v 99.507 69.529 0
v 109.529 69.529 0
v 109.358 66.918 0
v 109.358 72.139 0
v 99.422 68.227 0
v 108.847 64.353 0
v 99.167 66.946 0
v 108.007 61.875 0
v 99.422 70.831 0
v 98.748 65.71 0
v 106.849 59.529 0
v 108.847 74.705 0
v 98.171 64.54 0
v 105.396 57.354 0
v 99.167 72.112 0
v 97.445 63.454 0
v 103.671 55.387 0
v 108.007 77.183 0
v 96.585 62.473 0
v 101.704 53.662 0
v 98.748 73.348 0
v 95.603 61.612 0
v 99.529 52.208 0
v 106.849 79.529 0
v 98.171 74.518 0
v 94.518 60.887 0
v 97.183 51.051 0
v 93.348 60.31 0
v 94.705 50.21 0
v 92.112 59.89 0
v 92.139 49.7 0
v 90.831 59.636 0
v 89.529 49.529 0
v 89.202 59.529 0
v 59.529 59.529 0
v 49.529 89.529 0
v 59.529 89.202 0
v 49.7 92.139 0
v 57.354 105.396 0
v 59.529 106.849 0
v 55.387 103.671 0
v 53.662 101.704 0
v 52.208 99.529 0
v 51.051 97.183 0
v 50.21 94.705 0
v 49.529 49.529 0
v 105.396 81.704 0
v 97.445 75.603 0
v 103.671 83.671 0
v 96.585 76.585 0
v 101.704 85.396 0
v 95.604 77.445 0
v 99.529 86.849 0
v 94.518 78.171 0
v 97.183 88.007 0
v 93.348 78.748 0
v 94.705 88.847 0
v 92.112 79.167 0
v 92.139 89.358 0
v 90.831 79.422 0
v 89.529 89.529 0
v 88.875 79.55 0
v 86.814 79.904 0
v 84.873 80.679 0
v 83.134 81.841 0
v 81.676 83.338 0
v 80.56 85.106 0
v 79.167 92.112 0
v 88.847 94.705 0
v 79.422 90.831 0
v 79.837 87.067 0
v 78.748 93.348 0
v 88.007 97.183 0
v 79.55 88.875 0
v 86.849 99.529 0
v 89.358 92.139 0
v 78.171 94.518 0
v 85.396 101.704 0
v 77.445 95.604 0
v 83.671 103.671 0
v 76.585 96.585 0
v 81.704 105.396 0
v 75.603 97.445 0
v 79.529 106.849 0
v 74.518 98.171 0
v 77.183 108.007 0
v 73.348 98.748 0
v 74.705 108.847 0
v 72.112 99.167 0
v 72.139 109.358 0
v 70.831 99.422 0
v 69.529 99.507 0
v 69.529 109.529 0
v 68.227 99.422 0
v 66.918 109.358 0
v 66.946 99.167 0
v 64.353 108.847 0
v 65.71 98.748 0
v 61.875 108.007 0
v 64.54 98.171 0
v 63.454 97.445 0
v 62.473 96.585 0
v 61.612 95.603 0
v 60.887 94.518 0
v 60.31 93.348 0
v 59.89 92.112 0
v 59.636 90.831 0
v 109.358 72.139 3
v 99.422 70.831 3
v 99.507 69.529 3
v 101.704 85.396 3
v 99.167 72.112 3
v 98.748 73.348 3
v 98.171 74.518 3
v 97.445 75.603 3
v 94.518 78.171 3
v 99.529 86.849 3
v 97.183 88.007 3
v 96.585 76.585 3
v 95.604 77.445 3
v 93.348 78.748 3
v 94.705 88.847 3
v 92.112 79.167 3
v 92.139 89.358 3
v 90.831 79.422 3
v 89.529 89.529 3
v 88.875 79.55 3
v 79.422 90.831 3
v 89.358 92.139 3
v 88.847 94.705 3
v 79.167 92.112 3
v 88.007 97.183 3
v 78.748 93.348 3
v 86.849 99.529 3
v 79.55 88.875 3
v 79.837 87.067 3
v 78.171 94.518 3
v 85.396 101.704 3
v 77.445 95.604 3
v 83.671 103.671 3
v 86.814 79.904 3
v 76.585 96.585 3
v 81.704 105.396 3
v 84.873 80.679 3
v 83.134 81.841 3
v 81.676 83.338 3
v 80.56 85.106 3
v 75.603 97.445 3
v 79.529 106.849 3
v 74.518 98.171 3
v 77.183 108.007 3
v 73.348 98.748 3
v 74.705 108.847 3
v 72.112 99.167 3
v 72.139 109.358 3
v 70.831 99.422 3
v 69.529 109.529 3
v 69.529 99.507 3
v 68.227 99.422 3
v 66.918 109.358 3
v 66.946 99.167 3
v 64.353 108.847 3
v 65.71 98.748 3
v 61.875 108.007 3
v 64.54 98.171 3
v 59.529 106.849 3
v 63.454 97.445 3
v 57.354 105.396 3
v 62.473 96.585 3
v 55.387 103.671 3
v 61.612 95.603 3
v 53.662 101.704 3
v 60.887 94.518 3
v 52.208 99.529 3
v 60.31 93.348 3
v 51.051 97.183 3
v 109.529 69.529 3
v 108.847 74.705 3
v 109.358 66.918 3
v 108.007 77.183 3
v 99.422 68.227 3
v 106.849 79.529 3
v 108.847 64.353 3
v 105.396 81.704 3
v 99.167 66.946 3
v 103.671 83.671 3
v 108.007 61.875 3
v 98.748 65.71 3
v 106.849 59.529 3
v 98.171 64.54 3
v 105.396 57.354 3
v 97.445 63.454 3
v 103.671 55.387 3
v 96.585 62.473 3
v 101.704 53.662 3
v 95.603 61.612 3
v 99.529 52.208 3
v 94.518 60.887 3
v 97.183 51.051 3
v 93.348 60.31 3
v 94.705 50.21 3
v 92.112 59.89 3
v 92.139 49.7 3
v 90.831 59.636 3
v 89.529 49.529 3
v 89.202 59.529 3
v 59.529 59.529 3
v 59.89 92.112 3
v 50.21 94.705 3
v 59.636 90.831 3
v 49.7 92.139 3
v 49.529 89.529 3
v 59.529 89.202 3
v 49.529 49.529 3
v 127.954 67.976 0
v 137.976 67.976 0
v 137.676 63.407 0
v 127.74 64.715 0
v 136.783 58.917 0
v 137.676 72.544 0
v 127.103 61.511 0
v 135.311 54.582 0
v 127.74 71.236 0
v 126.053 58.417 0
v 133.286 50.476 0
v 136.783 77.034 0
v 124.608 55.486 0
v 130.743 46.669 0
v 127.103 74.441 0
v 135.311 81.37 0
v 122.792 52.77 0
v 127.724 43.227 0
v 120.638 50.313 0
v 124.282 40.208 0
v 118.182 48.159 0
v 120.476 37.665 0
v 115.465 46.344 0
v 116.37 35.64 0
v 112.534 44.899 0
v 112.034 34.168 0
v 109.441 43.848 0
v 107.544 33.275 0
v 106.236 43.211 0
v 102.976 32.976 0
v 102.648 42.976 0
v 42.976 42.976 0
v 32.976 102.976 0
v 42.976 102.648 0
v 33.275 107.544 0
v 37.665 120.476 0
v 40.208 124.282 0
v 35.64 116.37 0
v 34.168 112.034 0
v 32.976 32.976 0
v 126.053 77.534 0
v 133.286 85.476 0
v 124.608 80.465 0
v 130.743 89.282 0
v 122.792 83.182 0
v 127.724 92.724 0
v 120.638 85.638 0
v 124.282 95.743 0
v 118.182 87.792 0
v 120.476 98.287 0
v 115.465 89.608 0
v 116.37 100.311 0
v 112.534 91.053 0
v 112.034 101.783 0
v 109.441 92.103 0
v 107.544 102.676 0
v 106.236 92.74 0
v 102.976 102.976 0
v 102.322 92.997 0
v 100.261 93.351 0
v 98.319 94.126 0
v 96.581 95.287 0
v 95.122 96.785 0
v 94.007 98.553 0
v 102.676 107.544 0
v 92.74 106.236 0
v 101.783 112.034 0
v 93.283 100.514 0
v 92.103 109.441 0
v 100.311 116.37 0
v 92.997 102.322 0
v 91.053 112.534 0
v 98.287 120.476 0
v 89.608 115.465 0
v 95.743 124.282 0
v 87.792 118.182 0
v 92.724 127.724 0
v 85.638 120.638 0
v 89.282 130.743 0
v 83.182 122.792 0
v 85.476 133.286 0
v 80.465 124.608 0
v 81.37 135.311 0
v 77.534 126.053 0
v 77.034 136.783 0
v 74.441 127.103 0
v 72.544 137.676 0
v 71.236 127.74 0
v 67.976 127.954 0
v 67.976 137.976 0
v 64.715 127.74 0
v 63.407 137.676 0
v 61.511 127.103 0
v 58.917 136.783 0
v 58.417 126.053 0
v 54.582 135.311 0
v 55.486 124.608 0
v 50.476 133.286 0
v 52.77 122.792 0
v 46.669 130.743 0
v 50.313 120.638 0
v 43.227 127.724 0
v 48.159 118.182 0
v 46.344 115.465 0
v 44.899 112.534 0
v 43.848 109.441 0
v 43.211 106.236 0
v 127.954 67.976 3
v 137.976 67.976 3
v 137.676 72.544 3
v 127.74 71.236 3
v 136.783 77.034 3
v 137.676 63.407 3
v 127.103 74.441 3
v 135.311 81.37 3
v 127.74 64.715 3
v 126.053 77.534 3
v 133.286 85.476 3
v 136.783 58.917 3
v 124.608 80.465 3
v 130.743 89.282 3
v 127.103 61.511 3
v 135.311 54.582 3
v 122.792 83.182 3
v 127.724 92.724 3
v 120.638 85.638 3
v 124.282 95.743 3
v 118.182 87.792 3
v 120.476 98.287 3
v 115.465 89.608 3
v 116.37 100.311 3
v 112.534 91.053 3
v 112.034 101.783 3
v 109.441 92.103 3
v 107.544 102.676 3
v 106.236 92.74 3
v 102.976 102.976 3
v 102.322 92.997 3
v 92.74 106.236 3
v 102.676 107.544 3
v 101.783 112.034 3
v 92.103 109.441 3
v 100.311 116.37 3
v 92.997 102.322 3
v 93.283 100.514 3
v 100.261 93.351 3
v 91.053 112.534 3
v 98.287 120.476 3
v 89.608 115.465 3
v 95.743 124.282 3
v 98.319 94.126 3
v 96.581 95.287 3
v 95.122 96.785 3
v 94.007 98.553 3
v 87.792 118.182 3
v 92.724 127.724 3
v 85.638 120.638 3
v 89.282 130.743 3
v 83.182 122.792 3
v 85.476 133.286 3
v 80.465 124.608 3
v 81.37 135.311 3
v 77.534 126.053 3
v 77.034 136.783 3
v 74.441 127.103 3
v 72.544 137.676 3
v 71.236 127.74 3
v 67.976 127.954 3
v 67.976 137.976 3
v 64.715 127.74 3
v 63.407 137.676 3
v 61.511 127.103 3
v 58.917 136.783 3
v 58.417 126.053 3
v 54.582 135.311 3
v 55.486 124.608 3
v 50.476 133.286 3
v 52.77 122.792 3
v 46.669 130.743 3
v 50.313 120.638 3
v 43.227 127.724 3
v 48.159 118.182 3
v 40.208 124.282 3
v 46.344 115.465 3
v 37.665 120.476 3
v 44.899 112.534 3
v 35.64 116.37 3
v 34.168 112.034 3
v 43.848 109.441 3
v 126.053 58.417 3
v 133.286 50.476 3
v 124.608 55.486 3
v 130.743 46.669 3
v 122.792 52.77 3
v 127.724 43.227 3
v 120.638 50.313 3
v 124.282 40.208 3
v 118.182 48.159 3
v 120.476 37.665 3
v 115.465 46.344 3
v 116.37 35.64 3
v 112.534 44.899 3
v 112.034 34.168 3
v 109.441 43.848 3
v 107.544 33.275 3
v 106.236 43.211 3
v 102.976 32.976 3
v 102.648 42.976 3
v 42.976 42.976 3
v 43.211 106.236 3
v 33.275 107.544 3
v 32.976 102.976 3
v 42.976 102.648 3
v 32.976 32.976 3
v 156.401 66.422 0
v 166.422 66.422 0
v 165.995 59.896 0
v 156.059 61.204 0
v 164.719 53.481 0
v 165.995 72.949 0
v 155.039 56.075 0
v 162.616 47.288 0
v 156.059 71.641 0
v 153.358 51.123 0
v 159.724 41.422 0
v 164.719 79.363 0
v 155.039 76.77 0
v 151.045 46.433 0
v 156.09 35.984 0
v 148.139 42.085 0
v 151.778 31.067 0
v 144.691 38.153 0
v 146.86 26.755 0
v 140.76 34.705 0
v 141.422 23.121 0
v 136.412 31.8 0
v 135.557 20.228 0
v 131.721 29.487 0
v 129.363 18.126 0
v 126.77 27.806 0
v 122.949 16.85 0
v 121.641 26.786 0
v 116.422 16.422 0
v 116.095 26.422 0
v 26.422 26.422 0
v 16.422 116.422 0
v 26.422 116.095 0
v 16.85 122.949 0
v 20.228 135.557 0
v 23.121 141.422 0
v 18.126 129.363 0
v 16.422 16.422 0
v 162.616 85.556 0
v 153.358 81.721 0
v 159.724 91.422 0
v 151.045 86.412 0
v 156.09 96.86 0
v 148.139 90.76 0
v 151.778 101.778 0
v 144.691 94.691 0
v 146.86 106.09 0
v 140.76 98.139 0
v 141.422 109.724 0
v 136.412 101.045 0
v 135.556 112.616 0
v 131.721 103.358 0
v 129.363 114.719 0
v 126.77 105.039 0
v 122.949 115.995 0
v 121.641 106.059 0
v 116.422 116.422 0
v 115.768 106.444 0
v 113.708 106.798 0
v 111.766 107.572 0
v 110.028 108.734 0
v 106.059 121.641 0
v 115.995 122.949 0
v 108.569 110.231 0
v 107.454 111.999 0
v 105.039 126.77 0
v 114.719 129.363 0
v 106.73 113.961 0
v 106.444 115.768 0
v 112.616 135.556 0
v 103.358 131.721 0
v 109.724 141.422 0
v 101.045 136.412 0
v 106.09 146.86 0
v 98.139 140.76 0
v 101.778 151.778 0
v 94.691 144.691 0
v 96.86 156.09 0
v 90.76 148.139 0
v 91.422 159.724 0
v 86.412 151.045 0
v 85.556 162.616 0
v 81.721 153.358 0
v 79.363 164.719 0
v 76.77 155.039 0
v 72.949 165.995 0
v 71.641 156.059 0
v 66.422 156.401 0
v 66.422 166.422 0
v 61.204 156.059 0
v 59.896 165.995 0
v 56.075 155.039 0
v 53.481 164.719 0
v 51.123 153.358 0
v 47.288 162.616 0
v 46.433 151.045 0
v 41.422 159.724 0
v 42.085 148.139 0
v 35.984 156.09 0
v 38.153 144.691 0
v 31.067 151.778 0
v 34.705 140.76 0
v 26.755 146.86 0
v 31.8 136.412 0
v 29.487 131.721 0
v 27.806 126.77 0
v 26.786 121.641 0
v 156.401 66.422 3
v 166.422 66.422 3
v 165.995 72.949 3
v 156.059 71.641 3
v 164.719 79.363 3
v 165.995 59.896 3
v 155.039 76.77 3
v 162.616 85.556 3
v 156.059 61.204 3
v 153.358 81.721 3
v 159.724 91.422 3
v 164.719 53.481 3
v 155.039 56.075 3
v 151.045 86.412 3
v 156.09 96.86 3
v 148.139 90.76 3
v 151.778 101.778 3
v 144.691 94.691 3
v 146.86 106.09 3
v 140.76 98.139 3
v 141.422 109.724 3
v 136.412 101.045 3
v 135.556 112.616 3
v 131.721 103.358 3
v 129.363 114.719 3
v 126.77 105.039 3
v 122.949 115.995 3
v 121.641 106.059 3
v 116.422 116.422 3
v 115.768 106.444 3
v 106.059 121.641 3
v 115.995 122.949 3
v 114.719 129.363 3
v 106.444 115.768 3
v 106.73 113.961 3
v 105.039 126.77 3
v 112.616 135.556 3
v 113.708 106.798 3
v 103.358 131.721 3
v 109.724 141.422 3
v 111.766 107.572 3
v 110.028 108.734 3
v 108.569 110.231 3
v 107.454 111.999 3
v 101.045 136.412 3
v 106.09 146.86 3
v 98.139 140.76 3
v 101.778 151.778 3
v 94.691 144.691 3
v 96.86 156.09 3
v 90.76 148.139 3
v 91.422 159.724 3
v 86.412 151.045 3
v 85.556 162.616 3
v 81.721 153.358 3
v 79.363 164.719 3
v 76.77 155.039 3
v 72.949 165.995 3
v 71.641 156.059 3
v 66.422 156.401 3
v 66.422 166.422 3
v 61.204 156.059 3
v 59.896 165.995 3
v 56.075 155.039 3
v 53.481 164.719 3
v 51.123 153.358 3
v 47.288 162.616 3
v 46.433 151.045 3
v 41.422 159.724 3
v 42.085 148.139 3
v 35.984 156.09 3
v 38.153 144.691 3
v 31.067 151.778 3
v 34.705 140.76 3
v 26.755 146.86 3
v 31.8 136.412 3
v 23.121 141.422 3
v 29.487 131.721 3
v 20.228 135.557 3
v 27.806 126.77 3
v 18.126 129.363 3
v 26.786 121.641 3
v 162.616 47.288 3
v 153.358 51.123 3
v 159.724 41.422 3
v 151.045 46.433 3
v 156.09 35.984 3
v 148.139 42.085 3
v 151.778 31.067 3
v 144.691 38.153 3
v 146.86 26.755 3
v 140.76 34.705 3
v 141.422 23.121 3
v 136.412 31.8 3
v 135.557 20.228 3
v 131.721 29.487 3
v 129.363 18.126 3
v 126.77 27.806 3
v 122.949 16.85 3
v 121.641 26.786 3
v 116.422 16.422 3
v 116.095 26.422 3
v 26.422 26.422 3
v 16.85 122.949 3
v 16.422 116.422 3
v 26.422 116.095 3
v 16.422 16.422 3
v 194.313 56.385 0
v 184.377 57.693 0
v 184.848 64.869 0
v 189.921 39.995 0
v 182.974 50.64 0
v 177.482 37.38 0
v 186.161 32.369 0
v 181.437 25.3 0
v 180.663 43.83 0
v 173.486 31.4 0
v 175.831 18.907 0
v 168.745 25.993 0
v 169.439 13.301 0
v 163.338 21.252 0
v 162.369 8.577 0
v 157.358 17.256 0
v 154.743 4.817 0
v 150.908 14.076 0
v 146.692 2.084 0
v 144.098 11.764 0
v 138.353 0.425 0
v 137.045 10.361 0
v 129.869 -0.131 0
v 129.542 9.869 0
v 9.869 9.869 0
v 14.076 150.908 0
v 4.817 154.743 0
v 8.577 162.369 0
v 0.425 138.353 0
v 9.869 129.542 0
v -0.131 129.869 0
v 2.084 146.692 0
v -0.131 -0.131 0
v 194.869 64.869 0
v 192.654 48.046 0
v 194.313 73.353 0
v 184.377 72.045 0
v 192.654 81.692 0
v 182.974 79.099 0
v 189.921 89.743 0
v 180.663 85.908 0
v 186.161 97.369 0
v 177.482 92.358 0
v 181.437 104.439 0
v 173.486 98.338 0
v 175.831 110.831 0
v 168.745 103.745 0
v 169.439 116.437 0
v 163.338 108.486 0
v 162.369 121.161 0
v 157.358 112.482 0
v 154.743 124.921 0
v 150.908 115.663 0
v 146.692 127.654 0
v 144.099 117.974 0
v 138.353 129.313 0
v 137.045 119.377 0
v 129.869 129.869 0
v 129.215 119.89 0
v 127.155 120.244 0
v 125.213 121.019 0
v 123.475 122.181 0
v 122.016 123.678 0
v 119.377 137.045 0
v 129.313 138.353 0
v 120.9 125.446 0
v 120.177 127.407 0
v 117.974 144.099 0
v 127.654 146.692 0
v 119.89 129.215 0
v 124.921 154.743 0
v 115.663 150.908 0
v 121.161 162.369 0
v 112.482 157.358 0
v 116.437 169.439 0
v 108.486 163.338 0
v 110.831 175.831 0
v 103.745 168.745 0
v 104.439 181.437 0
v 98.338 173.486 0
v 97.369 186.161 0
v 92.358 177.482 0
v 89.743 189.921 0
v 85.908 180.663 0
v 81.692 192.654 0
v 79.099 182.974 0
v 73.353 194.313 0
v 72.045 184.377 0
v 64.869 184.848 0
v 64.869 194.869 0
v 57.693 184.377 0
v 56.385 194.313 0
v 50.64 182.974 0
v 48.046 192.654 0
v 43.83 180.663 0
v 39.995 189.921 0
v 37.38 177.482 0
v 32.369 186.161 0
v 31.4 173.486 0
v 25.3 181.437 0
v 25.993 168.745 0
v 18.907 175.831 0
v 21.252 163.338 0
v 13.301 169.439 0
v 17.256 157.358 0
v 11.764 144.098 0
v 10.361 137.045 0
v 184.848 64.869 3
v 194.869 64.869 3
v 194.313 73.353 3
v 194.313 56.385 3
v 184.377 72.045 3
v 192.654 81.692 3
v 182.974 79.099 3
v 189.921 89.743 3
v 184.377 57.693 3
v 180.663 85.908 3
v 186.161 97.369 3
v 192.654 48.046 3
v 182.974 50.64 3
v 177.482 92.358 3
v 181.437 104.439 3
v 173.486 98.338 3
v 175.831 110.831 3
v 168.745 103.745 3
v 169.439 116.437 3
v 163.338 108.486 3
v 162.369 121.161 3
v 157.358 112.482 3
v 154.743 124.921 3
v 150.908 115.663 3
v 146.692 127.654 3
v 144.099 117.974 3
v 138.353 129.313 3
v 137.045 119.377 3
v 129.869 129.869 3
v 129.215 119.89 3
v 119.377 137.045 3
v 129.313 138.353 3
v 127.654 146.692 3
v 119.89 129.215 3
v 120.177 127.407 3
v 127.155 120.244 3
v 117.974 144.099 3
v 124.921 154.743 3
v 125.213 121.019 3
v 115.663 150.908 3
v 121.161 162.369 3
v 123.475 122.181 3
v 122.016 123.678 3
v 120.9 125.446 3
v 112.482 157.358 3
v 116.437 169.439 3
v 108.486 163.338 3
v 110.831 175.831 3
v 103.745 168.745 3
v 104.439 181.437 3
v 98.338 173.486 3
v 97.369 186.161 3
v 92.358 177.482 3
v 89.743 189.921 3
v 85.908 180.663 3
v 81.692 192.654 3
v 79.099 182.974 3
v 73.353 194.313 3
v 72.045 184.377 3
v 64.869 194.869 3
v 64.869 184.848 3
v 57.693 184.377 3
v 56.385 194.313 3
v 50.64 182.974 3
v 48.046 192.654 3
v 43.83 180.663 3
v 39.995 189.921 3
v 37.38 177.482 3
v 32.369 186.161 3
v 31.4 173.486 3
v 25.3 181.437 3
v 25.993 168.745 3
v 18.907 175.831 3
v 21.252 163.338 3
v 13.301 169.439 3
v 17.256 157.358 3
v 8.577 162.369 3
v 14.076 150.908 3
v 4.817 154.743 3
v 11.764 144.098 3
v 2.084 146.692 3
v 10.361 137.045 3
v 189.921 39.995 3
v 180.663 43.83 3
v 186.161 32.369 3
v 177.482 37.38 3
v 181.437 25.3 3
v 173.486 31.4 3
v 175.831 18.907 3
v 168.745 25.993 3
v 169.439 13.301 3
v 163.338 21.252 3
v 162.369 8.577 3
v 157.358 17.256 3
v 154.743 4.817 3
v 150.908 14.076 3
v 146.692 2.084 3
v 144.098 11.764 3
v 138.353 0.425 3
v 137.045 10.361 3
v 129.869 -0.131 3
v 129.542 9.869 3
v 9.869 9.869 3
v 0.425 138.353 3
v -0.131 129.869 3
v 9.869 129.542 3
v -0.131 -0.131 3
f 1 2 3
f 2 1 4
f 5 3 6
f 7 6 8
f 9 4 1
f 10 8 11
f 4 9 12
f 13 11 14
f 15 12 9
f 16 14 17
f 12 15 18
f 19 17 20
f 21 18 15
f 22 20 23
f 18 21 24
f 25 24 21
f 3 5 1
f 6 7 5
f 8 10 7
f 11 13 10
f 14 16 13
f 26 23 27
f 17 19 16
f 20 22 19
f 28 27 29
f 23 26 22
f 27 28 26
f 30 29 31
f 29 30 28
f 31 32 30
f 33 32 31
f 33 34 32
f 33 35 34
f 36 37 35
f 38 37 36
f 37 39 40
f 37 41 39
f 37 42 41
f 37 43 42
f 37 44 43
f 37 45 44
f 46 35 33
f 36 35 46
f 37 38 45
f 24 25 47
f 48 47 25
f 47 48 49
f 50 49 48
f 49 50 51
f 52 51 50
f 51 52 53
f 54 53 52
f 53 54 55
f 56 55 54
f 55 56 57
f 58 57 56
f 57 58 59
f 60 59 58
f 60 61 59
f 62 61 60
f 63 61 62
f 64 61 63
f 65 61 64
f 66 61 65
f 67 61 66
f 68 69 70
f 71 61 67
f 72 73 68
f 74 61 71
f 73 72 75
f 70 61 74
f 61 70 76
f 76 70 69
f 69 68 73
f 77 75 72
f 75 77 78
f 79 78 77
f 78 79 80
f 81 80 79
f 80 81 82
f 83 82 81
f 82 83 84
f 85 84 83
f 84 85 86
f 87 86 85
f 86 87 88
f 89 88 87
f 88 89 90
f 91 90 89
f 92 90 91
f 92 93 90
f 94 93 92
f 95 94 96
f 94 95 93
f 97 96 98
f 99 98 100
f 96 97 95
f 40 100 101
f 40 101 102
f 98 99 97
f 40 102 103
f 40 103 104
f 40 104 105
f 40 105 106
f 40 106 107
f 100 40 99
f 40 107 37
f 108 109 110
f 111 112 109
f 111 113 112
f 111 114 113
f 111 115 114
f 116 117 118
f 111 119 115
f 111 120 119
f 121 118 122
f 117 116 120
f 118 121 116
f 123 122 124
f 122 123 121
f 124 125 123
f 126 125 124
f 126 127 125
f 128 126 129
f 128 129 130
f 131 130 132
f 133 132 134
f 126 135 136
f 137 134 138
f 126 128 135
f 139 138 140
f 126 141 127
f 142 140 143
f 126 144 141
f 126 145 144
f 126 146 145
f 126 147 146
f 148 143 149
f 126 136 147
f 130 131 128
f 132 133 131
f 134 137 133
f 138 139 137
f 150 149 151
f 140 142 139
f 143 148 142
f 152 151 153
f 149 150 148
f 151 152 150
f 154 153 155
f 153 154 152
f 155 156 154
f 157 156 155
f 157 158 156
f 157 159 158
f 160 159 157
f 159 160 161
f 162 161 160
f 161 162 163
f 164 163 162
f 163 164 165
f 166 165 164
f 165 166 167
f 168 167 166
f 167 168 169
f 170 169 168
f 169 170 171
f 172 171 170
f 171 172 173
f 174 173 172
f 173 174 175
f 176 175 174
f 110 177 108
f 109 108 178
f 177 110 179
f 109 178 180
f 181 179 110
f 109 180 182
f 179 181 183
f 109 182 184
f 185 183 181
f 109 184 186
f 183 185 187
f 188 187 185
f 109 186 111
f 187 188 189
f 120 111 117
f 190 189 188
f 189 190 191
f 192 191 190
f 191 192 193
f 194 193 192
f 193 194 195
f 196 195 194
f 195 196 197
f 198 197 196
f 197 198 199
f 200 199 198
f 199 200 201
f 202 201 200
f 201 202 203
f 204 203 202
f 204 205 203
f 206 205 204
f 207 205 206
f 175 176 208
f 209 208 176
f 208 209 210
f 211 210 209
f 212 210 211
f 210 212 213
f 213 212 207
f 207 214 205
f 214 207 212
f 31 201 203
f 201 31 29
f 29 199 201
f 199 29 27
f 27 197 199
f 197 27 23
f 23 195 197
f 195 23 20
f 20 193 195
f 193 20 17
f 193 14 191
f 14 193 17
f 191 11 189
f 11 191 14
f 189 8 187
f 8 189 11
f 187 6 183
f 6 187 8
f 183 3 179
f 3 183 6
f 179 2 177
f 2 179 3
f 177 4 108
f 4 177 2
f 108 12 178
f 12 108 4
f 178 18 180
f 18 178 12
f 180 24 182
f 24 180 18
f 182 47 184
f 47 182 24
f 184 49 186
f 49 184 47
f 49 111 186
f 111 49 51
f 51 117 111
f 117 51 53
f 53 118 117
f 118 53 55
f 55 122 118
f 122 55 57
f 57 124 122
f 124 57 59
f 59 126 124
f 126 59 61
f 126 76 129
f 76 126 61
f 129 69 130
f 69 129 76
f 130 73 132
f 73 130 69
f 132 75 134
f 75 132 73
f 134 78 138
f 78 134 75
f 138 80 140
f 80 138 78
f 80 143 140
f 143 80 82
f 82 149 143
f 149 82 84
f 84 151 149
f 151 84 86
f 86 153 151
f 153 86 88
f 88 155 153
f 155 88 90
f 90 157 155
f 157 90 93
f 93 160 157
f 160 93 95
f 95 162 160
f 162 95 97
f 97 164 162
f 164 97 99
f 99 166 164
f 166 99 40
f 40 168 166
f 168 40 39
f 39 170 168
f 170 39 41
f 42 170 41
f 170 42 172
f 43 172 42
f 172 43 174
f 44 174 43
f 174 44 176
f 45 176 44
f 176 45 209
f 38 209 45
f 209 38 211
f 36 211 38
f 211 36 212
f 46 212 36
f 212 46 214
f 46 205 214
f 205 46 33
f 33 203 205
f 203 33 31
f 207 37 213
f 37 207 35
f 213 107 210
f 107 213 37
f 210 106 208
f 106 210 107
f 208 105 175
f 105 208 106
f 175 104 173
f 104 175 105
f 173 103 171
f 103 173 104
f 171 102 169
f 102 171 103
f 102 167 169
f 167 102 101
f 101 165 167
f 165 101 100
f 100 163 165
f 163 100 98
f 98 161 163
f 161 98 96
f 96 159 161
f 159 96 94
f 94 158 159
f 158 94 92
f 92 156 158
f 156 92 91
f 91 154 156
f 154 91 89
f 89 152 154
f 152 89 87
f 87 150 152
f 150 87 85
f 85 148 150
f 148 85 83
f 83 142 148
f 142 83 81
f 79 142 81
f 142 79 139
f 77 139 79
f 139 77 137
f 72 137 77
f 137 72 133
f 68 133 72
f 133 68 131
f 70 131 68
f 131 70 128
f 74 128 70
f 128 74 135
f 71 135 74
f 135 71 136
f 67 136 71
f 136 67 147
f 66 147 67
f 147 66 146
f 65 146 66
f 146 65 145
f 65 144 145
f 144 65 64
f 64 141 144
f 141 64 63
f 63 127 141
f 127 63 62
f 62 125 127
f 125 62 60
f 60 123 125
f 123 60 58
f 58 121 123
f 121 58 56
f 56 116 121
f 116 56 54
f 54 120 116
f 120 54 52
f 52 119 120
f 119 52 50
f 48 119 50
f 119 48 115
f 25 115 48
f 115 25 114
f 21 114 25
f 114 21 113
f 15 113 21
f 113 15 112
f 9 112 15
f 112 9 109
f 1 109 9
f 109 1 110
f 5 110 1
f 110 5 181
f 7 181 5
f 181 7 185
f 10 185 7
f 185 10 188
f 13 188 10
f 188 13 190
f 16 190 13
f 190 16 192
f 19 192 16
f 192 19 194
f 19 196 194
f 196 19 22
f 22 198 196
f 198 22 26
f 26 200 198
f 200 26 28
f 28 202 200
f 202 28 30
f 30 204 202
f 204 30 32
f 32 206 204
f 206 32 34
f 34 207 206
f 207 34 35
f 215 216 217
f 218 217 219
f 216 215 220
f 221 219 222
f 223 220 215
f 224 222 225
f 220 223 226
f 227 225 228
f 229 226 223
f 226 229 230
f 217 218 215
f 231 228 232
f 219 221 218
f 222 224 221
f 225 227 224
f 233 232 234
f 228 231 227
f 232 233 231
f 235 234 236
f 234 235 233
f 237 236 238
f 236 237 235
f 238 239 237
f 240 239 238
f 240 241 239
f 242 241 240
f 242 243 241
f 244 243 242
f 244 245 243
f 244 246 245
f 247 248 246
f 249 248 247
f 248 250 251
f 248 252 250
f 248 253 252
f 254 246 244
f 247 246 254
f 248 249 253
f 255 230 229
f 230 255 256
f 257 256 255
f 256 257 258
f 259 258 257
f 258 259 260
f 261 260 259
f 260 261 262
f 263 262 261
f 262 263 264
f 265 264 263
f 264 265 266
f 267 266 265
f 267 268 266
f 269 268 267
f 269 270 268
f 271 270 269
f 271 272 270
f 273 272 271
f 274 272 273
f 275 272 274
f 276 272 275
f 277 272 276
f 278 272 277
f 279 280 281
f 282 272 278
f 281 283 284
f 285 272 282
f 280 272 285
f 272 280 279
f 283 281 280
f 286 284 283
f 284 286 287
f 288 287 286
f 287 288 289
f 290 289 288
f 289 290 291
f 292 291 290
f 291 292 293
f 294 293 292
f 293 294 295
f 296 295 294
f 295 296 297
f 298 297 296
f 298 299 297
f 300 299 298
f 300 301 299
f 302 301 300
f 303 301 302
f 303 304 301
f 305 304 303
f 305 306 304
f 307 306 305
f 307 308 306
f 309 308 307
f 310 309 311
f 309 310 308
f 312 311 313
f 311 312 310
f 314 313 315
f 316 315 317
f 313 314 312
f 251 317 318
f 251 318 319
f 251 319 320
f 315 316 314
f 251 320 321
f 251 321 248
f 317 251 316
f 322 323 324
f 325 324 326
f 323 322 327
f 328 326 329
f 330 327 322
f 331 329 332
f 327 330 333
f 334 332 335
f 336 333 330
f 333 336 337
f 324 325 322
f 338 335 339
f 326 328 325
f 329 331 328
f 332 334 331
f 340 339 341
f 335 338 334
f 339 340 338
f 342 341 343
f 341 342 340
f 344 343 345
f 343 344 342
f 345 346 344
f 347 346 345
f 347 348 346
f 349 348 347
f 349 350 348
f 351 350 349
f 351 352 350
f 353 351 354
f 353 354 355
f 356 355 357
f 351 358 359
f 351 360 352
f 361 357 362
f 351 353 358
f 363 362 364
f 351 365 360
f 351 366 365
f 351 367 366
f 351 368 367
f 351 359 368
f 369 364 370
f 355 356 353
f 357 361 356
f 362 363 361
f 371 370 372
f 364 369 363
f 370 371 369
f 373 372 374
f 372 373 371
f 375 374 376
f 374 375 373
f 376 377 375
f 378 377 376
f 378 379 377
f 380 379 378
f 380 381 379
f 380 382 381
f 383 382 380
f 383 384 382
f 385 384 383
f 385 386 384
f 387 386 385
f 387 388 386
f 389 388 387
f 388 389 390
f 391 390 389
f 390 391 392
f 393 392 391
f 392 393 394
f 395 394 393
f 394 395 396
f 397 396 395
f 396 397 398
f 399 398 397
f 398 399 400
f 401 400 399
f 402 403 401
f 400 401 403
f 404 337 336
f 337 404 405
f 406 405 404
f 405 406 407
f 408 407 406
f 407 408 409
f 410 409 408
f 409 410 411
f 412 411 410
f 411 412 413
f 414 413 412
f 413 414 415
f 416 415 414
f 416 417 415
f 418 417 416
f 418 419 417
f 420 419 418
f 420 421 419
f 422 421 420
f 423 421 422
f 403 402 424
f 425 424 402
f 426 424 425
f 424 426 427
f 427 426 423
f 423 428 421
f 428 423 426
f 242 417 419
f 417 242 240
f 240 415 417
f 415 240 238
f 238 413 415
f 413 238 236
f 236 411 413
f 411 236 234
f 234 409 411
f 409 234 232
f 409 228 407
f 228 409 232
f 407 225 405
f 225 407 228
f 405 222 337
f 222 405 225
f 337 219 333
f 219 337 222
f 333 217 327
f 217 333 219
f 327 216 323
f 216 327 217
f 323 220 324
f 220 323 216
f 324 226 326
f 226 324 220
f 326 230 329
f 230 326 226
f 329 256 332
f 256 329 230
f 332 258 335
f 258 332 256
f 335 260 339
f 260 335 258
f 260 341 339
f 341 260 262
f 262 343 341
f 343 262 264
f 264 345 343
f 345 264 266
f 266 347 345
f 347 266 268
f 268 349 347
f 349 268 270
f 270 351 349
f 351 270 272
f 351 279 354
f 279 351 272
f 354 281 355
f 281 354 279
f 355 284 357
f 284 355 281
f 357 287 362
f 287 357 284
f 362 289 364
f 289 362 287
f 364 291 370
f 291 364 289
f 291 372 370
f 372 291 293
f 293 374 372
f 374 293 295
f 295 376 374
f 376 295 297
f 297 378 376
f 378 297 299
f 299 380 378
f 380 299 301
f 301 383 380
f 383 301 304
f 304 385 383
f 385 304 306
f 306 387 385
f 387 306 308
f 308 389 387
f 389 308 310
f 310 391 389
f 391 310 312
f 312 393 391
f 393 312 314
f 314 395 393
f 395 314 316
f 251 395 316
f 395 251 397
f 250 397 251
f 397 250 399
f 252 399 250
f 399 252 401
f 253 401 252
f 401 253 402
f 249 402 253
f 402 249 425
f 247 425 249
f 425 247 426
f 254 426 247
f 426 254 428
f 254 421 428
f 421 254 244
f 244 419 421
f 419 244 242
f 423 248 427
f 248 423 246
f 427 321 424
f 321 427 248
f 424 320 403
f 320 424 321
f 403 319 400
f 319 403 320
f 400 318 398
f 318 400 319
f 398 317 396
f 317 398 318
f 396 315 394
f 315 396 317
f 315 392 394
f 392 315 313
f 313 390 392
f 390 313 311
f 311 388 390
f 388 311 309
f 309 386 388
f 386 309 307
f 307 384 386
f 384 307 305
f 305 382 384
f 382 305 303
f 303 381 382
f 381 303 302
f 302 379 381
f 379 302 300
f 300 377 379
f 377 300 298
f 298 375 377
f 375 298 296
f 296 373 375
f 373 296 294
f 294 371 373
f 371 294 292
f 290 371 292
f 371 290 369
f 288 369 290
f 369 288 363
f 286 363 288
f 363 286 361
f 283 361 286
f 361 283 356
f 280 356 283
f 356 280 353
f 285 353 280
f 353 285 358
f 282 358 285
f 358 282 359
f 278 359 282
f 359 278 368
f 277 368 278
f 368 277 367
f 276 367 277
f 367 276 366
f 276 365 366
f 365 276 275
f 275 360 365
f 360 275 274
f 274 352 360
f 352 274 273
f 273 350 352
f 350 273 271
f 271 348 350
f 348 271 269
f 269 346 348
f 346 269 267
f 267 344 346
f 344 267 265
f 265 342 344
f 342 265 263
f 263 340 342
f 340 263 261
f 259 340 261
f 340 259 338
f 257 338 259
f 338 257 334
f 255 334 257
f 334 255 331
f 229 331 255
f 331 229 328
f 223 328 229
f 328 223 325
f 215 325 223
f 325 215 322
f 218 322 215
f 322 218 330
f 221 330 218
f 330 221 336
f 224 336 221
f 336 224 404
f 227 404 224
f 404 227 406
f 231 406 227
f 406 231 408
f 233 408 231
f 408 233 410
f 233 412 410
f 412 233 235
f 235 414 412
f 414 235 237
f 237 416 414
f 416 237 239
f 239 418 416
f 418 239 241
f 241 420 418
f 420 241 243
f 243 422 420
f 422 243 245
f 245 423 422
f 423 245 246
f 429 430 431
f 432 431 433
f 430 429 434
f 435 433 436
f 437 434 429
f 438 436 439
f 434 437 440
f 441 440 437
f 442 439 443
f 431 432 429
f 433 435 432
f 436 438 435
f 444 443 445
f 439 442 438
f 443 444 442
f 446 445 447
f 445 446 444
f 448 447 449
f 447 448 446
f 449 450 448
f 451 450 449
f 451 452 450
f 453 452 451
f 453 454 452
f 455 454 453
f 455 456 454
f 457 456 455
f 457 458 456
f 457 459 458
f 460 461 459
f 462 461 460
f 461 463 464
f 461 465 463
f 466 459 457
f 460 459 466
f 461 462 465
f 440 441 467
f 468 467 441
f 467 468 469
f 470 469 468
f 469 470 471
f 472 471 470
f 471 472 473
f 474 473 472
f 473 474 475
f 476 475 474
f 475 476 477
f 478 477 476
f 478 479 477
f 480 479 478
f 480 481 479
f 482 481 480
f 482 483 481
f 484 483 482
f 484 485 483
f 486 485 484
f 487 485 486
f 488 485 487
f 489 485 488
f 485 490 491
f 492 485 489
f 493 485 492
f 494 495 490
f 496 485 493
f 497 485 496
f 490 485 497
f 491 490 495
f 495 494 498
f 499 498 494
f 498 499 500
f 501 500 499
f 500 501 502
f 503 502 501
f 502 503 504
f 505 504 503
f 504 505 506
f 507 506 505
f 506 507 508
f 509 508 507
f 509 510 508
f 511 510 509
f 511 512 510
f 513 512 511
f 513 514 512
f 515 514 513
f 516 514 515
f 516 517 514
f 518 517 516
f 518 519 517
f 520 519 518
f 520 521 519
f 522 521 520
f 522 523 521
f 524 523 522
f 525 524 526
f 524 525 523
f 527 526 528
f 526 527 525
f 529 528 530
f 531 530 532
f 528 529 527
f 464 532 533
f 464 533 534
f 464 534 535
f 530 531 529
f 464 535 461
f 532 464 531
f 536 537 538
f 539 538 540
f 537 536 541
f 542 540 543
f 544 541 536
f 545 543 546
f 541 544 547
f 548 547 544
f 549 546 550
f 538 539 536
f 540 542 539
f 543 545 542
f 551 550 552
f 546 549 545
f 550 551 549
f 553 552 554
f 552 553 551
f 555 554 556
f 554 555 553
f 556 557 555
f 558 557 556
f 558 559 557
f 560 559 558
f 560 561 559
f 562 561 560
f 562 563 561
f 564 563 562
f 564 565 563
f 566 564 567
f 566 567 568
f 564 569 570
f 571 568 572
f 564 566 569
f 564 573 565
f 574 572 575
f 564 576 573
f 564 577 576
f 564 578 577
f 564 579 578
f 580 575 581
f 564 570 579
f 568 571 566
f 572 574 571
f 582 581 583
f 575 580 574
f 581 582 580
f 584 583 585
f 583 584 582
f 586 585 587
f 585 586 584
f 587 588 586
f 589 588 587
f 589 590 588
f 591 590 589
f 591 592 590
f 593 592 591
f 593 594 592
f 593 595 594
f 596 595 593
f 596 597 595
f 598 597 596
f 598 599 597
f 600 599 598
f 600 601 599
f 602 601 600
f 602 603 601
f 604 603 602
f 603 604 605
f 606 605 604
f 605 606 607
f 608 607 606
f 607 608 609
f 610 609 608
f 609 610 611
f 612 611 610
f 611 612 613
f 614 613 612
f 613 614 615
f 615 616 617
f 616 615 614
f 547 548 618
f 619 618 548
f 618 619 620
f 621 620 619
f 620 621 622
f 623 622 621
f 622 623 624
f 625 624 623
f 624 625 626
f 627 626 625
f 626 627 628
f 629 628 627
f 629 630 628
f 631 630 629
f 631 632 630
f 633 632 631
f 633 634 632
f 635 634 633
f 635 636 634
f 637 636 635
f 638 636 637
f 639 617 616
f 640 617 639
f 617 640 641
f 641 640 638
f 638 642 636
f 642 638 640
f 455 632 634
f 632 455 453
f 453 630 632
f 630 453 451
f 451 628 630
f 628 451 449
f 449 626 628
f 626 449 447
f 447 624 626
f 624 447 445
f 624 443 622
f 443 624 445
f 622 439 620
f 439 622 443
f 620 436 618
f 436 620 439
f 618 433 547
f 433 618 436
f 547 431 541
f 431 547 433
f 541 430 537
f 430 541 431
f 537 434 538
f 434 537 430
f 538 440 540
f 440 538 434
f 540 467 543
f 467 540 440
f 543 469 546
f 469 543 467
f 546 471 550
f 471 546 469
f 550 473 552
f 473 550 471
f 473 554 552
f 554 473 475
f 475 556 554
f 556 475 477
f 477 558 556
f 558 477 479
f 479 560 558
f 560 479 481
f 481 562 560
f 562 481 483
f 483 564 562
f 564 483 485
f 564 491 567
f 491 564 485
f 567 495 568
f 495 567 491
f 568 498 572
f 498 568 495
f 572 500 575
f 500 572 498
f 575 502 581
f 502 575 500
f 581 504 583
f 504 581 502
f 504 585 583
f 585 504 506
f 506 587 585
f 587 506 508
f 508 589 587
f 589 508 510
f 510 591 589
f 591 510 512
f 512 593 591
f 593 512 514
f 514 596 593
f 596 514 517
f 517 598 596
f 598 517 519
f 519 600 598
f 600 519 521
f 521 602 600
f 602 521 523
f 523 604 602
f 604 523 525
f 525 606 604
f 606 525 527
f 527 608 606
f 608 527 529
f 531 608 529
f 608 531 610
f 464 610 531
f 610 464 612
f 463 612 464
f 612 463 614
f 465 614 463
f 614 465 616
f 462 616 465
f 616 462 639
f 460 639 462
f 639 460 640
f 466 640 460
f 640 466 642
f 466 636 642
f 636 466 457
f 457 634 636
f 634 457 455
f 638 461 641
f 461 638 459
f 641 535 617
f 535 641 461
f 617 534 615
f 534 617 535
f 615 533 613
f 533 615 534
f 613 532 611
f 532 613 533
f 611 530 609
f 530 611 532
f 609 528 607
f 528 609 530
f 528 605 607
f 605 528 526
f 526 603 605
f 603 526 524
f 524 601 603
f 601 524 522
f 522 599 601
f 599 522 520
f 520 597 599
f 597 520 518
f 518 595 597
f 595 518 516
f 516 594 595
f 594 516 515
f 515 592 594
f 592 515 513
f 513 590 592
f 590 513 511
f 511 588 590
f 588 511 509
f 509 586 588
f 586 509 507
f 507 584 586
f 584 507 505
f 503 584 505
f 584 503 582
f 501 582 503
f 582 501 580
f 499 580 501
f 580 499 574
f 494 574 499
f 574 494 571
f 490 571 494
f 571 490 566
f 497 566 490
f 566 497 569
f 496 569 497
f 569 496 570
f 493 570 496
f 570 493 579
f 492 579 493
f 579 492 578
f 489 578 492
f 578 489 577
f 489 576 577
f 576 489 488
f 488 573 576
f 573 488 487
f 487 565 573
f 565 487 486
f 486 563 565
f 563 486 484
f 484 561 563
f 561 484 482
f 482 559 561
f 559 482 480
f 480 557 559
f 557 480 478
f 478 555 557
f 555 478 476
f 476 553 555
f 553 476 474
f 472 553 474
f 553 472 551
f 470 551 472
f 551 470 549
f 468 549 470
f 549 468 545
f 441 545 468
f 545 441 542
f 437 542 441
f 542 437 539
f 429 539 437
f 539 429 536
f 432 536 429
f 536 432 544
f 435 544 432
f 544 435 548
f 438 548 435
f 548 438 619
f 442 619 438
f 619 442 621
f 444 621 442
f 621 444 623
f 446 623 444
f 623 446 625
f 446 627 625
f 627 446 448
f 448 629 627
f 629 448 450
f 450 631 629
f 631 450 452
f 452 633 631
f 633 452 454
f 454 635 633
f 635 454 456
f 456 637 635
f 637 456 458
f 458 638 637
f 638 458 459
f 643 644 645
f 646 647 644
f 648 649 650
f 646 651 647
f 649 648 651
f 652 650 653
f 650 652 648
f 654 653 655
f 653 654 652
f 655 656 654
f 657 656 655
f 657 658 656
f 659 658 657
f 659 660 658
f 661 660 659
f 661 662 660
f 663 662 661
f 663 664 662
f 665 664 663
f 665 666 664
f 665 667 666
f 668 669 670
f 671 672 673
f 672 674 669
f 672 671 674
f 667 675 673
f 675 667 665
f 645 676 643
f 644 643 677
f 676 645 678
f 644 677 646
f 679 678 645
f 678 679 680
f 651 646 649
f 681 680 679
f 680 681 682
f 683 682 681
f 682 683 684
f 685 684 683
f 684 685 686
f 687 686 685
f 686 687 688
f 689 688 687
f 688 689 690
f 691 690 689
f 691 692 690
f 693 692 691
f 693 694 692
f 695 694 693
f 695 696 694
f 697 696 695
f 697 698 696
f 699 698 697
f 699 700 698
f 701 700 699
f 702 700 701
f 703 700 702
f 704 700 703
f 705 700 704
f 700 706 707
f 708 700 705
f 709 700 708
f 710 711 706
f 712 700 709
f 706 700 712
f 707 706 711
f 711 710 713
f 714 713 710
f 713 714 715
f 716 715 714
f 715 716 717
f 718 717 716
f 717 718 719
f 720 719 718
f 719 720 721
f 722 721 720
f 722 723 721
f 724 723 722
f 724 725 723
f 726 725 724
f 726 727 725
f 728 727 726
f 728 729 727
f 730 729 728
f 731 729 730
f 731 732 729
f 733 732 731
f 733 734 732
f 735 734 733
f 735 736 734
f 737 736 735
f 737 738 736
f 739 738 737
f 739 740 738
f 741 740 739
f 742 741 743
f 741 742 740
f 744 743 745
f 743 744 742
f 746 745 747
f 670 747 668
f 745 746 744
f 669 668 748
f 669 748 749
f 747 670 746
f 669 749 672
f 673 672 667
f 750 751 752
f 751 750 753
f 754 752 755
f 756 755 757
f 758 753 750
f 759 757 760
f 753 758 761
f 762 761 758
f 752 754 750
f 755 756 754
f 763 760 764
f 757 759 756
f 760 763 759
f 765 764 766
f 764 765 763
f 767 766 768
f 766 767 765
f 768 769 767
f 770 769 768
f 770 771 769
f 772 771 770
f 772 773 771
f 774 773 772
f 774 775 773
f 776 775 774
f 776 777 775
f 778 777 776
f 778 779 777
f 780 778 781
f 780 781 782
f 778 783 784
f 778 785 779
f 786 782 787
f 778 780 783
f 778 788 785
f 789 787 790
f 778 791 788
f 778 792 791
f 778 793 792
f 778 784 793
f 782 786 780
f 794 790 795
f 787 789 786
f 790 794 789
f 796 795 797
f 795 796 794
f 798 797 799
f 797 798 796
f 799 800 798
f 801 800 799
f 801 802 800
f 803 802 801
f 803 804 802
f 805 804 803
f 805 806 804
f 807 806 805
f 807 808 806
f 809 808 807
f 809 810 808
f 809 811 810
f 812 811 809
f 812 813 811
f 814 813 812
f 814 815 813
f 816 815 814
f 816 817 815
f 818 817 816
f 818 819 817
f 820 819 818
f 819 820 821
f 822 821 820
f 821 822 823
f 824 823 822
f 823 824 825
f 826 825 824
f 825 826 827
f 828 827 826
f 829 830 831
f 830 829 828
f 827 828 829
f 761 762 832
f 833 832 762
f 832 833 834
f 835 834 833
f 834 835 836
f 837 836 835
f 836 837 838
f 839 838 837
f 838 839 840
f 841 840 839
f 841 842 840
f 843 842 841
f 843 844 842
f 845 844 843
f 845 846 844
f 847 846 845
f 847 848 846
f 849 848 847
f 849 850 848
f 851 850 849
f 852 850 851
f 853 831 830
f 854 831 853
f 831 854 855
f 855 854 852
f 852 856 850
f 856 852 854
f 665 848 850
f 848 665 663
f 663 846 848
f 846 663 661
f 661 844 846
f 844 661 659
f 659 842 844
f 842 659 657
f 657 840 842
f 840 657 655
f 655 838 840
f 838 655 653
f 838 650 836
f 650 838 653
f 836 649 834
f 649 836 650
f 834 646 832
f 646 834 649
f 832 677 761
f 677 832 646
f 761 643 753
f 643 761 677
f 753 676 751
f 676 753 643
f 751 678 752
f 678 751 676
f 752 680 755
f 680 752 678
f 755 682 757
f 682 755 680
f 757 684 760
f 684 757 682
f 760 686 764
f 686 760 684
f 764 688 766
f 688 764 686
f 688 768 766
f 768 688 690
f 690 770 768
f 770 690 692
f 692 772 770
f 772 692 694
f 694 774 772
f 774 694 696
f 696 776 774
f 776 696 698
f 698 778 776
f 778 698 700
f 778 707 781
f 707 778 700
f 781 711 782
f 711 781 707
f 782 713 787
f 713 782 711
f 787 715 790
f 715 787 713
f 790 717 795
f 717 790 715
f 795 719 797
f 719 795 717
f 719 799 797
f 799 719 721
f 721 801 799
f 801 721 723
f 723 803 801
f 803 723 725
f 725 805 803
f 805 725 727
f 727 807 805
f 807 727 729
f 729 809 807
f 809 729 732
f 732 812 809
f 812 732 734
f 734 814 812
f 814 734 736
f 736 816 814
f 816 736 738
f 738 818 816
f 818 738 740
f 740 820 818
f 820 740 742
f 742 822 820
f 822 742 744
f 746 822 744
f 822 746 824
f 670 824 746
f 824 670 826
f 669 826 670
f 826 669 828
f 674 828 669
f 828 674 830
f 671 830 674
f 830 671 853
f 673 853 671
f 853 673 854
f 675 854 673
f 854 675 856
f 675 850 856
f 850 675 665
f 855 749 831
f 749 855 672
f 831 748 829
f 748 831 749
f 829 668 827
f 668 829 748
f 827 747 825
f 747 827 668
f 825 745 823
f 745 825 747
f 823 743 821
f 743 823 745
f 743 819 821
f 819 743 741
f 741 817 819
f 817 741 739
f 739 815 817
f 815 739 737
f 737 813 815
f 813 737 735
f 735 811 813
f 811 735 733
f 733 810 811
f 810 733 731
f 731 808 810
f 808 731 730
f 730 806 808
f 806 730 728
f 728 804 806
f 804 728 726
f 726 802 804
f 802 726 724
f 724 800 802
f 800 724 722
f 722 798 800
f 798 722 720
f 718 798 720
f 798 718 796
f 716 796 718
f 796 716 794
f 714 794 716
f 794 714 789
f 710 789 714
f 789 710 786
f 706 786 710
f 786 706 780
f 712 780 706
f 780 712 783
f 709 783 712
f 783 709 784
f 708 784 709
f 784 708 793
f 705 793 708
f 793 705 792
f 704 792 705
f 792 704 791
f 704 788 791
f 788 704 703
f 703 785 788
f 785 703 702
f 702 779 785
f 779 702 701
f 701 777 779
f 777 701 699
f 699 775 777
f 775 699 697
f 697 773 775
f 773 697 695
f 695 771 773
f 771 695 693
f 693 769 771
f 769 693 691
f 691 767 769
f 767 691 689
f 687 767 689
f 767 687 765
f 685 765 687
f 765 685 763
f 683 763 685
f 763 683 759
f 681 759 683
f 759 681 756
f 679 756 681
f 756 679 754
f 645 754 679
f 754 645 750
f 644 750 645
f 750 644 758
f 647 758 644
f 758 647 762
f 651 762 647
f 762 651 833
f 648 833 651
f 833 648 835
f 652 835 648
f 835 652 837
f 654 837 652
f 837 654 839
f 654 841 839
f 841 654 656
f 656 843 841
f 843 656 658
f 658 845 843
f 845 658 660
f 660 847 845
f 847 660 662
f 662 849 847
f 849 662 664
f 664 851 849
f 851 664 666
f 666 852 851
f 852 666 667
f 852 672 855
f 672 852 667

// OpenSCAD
// Heart Purse

//
// This is a hacky work in progress that was done under deadline pressure.
//
// To use it:
//
// 1 - Generate a heart with Separators true and Separator holes false, render, save, slice, print
//
// 2 - Generate another heart with Separators false and Separator Holes true, render, save, load into
//     slicer then flip on Z (pancake flip), and mirror in Y. Check to make sure that the holes will
//     line up with the separators, slice, print.
//

// TODO:
//
// - Figure out why 1.6 (BlackMagicOriginOffset) is needed
// - Additional separators closer to top for better balance, get metrics by building a better "heart" module
// - Fix inner brim
// - Option to print separate side parts that click in
// - Option grid of hearts
// - Embedded magnets
// - Holes for hooks or chain
//


/* [Heart] */
// Heart thickness 
_HeartThickness = 3;

// Single heart width
_HeartWidth = 10;

// Starting heart radius
_HeartStartR = 20;

// Wnding heart radius
_HeartEndR = 70;

// Heart radius step
_HeartStepR = 15;

/* [Details] */

// Separators
_Separators = false;

// Hinge cut
_HingeCut = false;

// Separator Holes
_SeparatorHoles = false;

// Brim (works on part without separator)
_Brim = false;

/* [Separators] */

// Separator height
_SeparatorHeight = 36;

// Separator X/Y size
_SeparatorSize = 7;

// Separator gap
_SeparatorGap = 20;

// Separator count
_SeparatorCount = 6;

// Separator inset from x or y axis
_SeparatorInset = 1.5;

/* [Separator Holes] */

// Separator hole depth
_SeparatorHoleDepth = 1.5;

// Separator hole X/Y wiggle adjustment
_SeparatorHoleWiggle = 0.2;

/* [Brim] */

// Brim width
_BrimWidth = 0.6;

// Brim height
_BrimHeight = 0.4;

// Sanity check
assert(!(_Separators && _SeparatorHoles), "Pick either separators or holes, not both!");
assert(!(_Separators && _Brim), "Don't use brim and separators together!");

// Black Magic - This makes the heart land at 0,0
BlackMagicOriginOffset = 1.6;
//BlackMagicOriginOffset = 0.0;

// Heart module based on math and code from https://openhome.cc/eGossip/OpenSCAD/Heart.html
module heart_sub_component(radius)
{
    rotated_angle = 45;
    diameter = radius * 2;
    $fn = 48;

    translate([-radius * cos(rotated_angle), 0, 0]) 
	{
        rotate(-rotated_angle) 
		{
			union()
			{
				circle(radius);
				translate([0, -radius, 0]) 
				{
					square(diameter);
				}
			}
		}
	}
}

module Heart(radius, center=true)
{
    offsetX = center ? 0 : radius + radius * cos(45);
    offsetY = center ? 1.5 * radius * sin(45) - 0.5 * radius : 3 * radius * sin(45);

    //center_offset_y = 1.5 * radius * sin(45) - 0.5 * radius;
	//echo("COY", center_offset_y);
	
	rotate(-45)
	{
		translate([offsetX, offsetY, 0]) union()
		{
			heart_sub_component(radius);
			
			mirror([1, 0, 0]) 
			{
				heart_sub_component(radius);
			}
		}
	}
}
// End of heart module

module HollowHeart(HeartRadius, Inset)
{
    difference()
    {
        Heart(HeartRadius);
        offset(-Inset) Heart(HeartRadius);
    }
}

// Nested rings of hearts
module HeartRings(Thickness, HeartStartR, HeartEndR, HeartStepR, HeartWidth, Brim, BrimWidth, BrimHeight)
{
    for (r = [HeartStartR : HeartStepR : HeartEndR])
    {
        linear_extrude(Thickness)
        {    
            HollowHeart(r, HeartWidth);
        }

		if (Brim)
		{
			translate([0, 0, Thickness])
			{
				{
					linear_extrude(BrimHeight)
					{
						HollowHeart(r, BrimWidth);
						// Following heart does not work right  - creates brim over thin air
						//HollowHeart(r - HeartWidth + (2 * BrimWidth), BrimWidth);
					}
				}
			}
		}
    }
}

// Separators
module HeartSeparators(BaseThickness, Height, Size, Gap, Count, Inset)
{
	// X Axis separators
	for (x = [0 : Count])
	{
		PointX = x * Gap + Inset;
		translate([PointX, Inset, BaseThickness])
		{
			cube([Size, Size, Height]);
		}
	}

	// Y Axis separators
	for (y = [1 : Count])
	{
		PointY = y * Gap;
		translate([Inset, PointY, BaseThickness])
		{
			cube([Size, Size, Height]);
		}
	}
}

// Separator holes, to be used as negative volume
module HeartSeparatorHoles(Depth, Wiggle, Size, Gap, Count, Inset)
{
	HalfWiggle = Wiggle / 2;
	
	// X Axis separator holes
	for (x = [0 : Count])
	{
		PointX = x * Gap + Inset;
		translate([PointX - HalfWiggle, Inset - HalfWiggle, -.001])
		{
			cube([Size + Wiggle, Size + Wiggle, Depth + .002]);
		}
	}

	// Y Axis separator holes
	for (y = [1 : Count])
	{
		PointY = y * Gap;
		translate([Inset - HalfWiggle, PointY - HalfWiggle, -.001])
		{
			cube([Size + Wiggle, Size + Wiggle, Depth + .002]);
		}
	}
}

// Render hearts
//
// Translate and rotate so that it is easier to see size of 
// finished set of hearts (BlackMagicOriginOffsetis empirical, and probably an actual computable value if I was smart enough)

module RenderHearts(HeartThickness, HeartStartR, HeartEndR, HeartStepR, HeartWidth, Brim, BrimWidth, BrimHeight)
{
	translate([HeartEndR + BlackMagicOriginOffset, HeartEndR + BlackMagicOriginOffset, 0])
	{
		//rotate(-45)
		{
			HeartRings(HeartThickness, HeartStartR, HeartEndR, HeartStepR, HeartWidth, Brim, BrimWidth, BrimHeight);
		}
	}
}

// Render a cut hinge (negative space) - Portion is fraction 0 to 1 of Length, determines position of hinge
module RenderHingeCut(Portion, Thickness, Length)
{
	translate([Portion * Length, Portion * Length, 0])
	rotate([0, 0, -45])
	{
		translate([-Length, 0, 0])
		cube([2 * Length, 3, Thickness + .001]);
	}
}

// Render the matter - heart itself aned optional separators
module RenderHeartMatter(HeartThickness, HeartStartR, HeartEndR, HeartStepR, HeartWidth, Separators, SeparatorHeight, SeparatorSize, SeparatorGap, SeparatorCount, SeparatorInset, Brim, BrimWidth, BrimHeight)
{
	RenderHearts(HeartThickness, HeartStartR, HeartEndR, HeartStepR, HeartWidth, Brim, BrimWidth, BrimHeight);

	if (Separators)
	{
		HeartSeparators(HeartThickness, SeparatorHeight, SeparatorSize, SeparatorGap, SeparatorCount, SeparatorInset);
	}
}

// Render the antimatter - optional hinge and optional separator holes
module RenderHeartAntiMatter(HingeCut, HeartThickness, HeartEndR, SeparatorHoles, SeparatorHoleDepth, SeparatorHoleWiggle, SeparatorSize, SeparatorGap, SeparatorCount, SeparatorInset)
{
		if (HingeCut)
		{
			RenderHingeCut(0.75, HeartThickness, 2 * HeartEndR);
		}
		
		if (SeparatorHoles)
		{
			HeartSeparatorHoles(SeparatorHoleDepth, SeparatorHoleWiggle, SeparatorSize, SeparatorGap, SeparatorCount, SeparatorInset);
		}
}

module main()
{
	difference()
	{
		// Matter: Heart and optional separators
		{
			RenderHeartMatter(_HeartThickness, _HeartStartR, _HeartEndR, _HeartStepR, _HeartWidth, _Separators, _SeparatorHeight, _SeparatorSize, _SeparatorGap, _SeparatorCount, _SeparatorInset, _Brim, _BrimWidth, _BrimHeight);
		}
		
		// Anti-matter: Optional hinge and optional hinge holes
		{
			RenderHeartAntiMatter(_HingeCut, _HeartThickness, _HeartEndR, _SeparatorHoles, _SeparatorHoleDepth, _SeparatorHoleWiggle, _SeparatorSize, _SeparatorGap, _SeparatorCount, _SeparatorInset);
		}
	}
}

main();
	
//translate([0, -5, 0]) cube([30, 5, 1], center=false);
/*linear_extrude(1)
translate([50, 50, 0])
Heart(50);*/
